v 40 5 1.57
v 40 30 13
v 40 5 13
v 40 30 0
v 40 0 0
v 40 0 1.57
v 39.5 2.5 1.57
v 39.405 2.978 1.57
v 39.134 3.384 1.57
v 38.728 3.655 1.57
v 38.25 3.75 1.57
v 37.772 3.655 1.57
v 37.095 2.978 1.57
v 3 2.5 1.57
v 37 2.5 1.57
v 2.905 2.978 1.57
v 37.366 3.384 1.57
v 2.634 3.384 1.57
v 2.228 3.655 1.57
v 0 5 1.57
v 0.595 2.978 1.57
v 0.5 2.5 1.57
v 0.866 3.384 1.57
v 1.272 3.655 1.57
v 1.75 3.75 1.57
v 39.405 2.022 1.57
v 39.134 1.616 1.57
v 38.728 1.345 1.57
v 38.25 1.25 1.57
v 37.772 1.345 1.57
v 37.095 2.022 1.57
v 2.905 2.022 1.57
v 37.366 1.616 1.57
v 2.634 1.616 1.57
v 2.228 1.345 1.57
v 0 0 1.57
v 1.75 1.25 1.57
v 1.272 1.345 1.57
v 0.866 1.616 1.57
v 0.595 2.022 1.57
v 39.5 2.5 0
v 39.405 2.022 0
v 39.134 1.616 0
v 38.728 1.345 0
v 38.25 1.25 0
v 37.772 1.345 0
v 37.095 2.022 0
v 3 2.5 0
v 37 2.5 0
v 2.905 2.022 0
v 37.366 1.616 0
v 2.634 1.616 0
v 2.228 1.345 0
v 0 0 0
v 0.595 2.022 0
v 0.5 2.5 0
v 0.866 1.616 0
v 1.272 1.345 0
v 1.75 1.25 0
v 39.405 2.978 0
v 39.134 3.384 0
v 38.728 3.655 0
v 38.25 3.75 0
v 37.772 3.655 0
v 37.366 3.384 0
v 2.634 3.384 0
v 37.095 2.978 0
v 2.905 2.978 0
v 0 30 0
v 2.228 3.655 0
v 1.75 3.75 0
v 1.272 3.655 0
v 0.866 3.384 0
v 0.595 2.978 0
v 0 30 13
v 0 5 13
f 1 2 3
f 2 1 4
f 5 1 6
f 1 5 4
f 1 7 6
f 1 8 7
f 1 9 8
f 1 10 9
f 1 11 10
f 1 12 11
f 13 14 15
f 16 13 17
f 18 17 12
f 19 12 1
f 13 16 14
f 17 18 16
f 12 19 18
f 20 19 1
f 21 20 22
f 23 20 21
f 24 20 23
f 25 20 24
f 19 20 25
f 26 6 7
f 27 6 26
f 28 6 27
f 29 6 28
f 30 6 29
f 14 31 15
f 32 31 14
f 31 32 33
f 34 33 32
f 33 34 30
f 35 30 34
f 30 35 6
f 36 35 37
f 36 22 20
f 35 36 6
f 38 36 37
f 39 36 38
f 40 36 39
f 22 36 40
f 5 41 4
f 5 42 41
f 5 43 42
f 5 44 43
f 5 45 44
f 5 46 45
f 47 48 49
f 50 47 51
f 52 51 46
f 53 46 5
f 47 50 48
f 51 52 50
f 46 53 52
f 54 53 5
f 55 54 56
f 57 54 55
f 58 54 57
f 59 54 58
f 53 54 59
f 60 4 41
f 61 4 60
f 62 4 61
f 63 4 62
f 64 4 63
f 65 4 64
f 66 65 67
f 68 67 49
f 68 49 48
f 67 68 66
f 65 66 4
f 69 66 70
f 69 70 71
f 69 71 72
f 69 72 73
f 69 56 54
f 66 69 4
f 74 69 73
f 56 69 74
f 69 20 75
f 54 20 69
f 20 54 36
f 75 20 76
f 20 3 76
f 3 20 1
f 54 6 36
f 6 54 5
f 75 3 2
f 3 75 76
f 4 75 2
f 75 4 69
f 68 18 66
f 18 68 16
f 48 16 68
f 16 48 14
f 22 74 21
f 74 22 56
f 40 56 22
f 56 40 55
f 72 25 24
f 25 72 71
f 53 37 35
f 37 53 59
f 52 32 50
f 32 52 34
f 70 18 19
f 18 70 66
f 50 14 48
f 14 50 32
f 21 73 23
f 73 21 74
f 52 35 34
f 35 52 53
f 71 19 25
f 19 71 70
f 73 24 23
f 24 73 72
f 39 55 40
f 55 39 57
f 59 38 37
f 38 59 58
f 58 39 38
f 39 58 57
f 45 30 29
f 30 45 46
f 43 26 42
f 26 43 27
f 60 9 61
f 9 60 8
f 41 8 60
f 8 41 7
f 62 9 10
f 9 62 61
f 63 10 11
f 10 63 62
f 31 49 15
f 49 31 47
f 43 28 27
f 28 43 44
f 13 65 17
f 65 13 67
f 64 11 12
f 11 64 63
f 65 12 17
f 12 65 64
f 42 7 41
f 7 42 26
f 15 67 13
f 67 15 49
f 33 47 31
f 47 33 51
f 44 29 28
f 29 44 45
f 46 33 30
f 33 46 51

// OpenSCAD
$fa = 1;
$fs = 0.5;

BOARD_THICKNESS = 1.57;

seesaw();

module seesaw() {
  difference() {
    union() {
      cube([40, 5, BOARD_THICKNESS]);

      translate([0, 5, 0])
      cube([40, 25, 13]);
    }

    translate([(40 - 36.5) / 2, 2.5])
    union() {
      hole([0, 0]);
      hole([36.5, 0]);
    }
  }
}


module hole(pos) {
  translate(pos)
  translate([0, 0, -1])
  cylinder(d=2.5, h=3);
}
